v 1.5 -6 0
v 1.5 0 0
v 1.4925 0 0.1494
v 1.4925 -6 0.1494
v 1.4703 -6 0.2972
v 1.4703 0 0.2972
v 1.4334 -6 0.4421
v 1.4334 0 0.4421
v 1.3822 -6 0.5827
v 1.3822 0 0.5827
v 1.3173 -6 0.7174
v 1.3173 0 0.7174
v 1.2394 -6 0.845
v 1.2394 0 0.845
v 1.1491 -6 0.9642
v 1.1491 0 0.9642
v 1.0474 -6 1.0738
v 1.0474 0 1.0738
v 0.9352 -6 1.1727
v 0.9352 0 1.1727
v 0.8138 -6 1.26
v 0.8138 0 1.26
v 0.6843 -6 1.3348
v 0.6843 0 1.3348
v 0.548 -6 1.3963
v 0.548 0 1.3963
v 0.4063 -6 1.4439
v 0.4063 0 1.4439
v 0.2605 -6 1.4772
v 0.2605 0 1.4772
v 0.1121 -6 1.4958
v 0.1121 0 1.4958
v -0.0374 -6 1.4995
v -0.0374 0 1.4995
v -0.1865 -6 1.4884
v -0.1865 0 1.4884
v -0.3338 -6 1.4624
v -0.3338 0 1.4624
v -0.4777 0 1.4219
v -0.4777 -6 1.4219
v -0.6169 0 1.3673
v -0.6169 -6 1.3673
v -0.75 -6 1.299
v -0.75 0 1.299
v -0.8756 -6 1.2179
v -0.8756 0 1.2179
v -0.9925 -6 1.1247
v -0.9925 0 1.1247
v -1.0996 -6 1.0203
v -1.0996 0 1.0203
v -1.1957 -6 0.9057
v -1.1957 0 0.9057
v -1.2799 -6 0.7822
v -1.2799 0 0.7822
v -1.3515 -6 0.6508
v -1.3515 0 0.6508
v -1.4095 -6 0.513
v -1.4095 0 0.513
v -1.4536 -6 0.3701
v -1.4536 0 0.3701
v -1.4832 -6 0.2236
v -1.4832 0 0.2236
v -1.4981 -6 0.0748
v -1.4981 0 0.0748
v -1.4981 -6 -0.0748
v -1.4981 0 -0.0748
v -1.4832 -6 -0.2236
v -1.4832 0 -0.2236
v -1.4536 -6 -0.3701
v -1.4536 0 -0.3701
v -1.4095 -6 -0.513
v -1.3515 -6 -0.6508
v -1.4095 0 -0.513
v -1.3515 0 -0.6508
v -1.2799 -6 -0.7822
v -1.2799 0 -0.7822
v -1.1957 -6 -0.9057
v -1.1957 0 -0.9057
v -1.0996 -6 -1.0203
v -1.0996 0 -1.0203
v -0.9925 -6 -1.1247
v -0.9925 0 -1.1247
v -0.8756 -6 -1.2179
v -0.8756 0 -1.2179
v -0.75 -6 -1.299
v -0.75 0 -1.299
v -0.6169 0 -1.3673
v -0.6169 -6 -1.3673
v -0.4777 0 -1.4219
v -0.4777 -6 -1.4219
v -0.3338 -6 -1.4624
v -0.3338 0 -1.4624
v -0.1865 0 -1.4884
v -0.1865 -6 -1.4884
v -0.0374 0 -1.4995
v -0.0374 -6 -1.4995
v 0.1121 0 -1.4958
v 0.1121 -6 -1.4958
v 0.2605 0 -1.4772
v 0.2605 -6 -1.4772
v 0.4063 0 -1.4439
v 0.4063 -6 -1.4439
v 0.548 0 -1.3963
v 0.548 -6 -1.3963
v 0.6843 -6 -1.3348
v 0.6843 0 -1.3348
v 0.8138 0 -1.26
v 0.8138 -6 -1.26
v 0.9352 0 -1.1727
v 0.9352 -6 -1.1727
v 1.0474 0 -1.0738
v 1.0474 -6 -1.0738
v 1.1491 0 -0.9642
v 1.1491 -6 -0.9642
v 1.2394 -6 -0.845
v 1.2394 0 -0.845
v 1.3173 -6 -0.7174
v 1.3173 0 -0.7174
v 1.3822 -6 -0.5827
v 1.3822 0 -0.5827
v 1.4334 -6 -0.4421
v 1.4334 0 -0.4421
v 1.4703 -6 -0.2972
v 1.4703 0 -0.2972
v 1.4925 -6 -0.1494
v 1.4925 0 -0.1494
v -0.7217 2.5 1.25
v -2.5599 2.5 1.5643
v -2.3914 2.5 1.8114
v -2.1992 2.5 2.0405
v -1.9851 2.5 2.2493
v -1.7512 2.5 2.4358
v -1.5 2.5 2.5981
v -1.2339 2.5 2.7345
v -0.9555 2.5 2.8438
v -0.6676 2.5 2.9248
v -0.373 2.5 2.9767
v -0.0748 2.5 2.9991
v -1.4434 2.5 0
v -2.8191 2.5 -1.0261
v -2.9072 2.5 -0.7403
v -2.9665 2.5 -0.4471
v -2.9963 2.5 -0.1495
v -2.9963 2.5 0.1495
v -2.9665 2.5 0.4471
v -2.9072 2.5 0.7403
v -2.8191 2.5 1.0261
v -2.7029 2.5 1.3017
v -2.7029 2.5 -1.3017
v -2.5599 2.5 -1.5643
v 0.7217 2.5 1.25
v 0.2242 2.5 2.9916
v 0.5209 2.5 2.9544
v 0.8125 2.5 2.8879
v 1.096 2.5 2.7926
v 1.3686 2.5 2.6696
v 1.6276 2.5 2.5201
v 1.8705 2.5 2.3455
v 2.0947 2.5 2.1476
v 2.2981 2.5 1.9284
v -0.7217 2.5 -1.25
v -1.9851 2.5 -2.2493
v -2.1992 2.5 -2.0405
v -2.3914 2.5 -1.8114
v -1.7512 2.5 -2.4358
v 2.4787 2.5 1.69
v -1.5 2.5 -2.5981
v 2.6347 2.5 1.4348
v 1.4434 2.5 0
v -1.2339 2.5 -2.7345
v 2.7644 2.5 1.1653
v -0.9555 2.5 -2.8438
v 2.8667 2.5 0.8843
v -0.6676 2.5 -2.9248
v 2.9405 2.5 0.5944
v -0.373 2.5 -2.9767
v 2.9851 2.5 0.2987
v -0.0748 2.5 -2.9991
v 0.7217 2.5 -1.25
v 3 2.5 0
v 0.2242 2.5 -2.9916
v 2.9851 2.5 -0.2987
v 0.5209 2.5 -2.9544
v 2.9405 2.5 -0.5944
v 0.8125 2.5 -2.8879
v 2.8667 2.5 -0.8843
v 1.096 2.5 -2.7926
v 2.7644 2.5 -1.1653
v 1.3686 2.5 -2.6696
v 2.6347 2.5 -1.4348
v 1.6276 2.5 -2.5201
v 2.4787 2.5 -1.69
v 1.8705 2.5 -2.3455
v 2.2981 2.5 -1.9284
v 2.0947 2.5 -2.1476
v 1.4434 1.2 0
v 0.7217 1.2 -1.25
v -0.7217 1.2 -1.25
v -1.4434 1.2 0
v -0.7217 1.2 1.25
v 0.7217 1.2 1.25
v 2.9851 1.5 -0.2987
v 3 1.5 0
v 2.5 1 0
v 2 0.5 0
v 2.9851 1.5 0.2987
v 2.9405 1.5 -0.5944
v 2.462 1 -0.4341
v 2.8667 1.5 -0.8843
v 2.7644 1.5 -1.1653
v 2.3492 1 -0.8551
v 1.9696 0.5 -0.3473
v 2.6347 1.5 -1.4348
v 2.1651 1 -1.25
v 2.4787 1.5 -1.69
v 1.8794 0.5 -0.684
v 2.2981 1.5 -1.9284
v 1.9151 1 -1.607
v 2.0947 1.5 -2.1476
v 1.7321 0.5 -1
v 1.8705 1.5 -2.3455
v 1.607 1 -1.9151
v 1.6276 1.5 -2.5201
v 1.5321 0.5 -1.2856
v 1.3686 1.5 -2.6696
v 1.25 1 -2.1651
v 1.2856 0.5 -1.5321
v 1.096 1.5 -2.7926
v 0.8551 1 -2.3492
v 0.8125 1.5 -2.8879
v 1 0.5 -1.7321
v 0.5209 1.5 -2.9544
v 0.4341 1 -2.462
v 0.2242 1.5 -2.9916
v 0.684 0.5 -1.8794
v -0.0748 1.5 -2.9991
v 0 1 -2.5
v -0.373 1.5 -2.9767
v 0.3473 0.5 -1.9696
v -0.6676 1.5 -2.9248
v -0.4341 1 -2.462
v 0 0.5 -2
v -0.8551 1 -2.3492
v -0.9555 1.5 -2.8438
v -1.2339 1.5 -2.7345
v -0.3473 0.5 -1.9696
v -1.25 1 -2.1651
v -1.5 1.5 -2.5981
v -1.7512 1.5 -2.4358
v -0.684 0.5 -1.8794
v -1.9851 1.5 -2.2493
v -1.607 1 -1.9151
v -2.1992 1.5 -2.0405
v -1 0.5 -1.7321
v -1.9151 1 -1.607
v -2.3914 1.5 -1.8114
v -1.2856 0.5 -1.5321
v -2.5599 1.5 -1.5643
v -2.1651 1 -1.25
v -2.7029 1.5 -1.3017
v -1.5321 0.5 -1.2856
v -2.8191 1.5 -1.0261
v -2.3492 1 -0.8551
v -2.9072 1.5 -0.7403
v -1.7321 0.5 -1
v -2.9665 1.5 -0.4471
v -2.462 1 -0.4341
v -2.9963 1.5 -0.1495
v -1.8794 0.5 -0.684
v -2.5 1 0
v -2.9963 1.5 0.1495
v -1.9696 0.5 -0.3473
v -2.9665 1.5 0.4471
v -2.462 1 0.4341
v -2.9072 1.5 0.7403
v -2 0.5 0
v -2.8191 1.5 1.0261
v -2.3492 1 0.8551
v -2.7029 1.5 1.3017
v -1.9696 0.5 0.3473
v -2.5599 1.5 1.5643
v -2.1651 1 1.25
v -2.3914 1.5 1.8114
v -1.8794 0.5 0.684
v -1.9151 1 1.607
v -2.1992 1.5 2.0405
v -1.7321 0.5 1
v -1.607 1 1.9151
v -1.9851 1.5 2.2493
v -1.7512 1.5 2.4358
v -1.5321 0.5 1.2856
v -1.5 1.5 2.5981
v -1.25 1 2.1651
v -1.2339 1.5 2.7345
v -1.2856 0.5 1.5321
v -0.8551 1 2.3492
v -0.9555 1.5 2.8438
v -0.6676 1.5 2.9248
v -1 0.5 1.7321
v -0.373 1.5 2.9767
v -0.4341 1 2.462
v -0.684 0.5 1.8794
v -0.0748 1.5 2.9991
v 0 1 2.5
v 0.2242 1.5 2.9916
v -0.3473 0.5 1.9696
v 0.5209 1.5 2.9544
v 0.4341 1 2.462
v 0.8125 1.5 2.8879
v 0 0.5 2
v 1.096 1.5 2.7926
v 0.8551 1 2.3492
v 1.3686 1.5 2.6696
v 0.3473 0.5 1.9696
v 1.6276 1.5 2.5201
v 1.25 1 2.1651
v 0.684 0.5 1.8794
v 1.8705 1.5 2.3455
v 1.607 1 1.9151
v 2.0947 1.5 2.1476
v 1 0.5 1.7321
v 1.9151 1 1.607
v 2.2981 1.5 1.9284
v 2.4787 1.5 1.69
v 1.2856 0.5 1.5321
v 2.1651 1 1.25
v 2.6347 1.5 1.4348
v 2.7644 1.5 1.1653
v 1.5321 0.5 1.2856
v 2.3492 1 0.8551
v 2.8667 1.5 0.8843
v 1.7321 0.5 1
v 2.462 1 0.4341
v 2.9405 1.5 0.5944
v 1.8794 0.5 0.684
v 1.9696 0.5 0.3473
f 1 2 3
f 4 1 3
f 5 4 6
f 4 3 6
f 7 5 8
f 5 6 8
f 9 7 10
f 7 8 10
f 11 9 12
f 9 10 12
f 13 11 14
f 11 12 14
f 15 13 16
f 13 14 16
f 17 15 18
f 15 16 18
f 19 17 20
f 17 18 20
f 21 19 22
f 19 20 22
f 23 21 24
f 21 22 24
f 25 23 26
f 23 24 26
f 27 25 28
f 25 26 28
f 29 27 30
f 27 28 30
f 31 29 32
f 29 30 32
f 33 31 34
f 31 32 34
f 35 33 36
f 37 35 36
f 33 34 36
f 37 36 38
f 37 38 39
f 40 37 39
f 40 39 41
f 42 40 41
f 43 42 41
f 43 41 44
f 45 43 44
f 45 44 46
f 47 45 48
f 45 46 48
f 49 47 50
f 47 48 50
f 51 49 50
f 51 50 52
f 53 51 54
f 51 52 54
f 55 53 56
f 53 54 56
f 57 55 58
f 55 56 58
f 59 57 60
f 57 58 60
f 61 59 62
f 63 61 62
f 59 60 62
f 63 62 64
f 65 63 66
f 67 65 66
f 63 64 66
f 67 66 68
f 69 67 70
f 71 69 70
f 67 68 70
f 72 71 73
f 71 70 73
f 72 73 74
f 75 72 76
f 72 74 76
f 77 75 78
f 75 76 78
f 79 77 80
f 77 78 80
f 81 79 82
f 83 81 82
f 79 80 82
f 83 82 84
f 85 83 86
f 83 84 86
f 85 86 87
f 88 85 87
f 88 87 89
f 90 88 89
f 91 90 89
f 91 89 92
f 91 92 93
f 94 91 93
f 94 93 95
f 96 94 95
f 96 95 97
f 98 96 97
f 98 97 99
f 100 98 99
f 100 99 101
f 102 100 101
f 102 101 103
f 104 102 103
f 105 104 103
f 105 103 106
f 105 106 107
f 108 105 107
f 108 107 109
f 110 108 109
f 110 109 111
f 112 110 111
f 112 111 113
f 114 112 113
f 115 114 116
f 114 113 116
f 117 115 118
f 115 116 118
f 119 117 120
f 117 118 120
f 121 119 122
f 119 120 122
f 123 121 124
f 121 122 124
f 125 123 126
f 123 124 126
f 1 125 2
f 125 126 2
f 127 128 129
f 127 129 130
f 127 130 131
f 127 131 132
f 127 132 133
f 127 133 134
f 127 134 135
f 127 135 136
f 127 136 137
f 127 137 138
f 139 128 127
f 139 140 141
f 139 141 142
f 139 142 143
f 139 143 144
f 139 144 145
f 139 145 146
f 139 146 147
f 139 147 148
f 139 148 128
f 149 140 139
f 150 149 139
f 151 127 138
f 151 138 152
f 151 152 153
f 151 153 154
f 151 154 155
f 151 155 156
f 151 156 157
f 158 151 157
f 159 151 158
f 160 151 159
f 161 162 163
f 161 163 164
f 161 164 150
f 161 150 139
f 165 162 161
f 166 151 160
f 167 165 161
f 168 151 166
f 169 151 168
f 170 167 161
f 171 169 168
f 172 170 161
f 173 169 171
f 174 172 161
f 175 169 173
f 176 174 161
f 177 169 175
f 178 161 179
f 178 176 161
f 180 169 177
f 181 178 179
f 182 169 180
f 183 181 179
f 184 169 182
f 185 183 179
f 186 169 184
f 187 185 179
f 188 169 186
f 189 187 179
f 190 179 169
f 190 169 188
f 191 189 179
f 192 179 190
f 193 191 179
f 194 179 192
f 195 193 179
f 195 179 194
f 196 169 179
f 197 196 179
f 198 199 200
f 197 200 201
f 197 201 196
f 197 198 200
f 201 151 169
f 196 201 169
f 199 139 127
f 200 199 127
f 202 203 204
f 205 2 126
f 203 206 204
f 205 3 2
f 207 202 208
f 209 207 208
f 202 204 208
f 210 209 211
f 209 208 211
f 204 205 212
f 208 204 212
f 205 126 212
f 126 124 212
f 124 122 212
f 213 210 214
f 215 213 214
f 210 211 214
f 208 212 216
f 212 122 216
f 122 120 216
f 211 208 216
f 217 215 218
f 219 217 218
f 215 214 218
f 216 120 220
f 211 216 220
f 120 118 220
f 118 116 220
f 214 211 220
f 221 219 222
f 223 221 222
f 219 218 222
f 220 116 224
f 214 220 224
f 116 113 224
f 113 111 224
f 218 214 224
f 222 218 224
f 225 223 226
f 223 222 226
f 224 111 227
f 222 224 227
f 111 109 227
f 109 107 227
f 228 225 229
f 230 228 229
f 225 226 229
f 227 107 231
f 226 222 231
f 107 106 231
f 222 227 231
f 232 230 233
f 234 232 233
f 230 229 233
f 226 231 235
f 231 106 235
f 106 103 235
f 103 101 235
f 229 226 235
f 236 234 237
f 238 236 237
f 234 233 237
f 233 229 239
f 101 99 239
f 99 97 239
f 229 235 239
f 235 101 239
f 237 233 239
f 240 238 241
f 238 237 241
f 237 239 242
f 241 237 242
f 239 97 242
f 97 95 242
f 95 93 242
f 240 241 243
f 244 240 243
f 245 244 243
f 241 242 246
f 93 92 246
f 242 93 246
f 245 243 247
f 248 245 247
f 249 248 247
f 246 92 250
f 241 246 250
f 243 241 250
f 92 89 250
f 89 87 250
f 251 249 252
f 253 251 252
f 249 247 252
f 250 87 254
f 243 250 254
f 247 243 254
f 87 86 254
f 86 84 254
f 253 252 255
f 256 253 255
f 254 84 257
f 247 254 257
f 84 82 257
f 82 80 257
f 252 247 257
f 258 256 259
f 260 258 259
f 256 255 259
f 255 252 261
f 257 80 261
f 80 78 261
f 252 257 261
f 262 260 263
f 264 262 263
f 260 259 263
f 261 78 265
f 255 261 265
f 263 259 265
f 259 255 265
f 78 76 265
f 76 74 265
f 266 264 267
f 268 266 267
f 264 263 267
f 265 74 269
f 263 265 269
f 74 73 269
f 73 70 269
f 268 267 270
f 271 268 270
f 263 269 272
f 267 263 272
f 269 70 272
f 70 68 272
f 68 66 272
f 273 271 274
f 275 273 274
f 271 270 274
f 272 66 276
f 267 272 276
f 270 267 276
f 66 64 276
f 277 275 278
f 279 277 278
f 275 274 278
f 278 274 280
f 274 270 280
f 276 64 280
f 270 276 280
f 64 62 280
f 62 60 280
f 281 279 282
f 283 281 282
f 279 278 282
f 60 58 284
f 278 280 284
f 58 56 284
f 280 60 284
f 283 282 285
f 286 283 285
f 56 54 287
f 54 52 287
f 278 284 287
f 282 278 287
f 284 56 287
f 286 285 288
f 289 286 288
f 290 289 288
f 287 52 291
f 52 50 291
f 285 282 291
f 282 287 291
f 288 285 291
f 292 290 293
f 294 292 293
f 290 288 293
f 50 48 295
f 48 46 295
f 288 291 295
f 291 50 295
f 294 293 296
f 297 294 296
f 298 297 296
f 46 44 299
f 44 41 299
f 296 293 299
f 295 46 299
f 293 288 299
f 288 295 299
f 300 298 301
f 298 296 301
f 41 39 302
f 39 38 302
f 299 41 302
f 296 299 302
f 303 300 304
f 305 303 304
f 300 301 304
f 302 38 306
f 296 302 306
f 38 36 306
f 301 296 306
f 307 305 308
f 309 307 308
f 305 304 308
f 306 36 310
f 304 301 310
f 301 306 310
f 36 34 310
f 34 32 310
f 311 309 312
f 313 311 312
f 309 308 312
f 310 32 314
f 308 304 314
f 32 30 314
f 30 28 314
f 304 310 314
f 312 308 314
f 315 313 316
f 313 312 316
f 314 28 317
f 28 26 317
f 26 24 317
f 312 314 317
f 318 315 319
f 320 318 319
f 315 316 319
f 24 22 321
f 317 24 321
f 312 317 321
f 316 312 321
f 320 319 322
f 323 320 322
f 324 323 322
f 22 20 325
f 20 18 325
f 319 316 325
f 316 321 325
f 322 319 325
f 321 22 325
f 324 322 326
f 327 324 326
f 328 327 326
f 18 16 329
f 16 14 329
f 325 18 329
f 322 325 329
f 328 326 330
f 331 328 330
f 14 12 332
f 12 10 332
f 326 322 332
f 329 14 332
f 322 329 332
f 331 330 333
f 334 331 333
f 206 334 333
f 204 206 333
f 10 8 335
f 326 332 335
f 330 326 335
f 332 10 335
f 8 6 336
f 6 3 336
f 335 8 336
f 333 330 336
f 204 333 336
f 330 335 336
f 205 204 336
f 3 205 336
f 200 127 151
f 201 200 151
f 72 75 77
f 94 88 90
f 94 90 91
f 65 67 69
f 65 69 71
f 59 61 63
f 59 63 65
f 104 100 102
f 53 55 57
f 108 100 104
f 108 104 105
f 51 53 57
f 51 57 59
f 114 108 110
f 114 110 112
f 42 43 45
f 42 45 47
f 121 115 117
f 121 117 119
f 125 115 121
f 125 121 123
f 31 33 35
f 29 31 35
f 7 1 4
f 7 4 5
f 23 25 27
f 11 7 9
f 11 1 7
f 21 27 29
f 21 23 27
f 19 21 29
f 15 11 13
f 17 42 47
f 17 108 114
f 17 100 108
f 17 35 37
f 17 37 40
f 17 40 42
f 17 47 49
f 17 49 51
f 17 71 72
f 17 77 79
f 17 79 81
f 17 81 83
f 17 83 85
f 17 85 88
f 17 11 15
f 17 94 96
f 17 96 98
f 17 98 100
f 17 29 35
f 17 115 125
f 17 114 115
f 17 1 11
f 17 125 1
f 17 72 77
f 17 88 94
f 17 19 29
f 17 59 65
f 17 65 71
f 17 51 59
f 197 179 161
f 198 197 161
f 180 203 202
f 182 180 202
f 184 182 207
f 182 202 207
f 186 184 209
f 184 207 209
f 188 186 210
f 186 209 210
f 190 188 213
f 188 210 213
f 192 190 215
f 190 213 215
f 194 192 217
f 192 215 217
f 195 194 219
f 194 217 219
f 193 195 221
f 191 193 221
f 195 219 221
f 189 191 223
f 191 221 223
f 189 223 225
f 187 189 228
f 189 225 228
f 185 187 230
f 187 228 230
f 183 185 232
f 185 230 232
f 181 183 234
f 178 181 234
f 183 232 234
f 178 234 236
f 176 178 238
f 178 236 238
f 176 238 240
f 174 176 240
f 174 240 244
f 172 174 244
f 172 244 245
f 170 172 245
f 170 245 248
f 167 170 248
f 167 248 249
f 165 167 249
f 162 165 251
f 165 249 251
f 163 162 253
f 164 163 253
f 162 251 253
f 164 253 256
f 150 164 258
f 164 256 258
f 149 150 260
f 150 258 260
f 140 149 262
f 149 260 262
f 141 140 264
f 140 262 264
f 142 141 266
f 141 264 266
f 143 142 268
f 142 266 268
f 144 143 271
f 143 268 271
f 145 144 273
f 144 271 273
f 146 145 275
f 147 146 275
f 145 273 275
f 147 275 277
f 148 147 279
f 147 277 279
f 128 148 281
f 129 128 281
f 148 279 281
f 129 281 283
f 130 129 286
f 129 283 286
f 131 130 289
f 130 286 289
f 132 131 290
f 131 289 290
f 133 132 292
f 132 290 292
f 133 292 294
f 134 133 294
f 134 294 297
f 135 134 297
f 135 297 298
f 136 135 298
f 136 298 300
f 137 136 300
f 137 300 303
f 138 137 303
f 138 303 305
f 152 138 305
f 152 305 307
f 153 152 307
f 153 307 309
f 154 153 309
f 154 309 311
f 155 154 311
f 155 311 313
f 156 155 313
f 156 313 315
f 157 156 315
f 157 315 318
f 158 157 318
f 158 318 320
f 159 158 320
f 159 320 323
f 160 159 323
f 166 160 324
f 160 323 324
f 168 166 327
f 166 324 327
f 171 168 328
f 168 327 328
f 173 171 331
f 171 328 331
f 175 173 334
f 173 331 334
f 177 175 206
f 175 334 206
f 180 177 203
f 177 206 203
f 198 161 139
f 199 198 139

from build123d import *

# Parameters (mm, degrees)
SKETCH_1_R            = 3
EXTRUDE_251_DEPTH     = 2.5
CHAMFER_1_SIZE        = 1.5
CUT_EXTRUDE_459_DEPTH = 1.3
SKETCH_3_R            = 1.5
EXTRUDE_571_DEPTH     = 6


with BuildPart() as part:
    # 草图1 → Extrude 251 (new body)
    with BuildSketch(Plane(origin=(0, 0, 0), x_dir=(1, 0, 0), z_dir=(0, 1, 0))):
        Circle(SKETCH_1_R)
    extrude(amount=EXTRUDE_251_DEPTH)

    # 倒角1
    chamfer_1_edges = [part.edges().sort_by_distance(p)[0] for p in [
        (-3, 0, 0),
    ]]
    chamfer(chamfer_1_edges, length=CHAMFER_1_SIZE)

    # 草图2 → Cut-Extrude 459 (cut)
    with BuildSketch(Plane(origin=(0, 2.5, 0), x_dir=(1, 0, 0), z_dir=(0, 1, 0))):
        Polygon((1.443375673, 0), (0.721687836, 1.25), (-0.721687836, 1.25), (-1.443375673, 0), (-0.721687836, -1.25), (0.721687836, -1.25), align=None)
    extrude(amount=-CUT_EXTRUDE_459_DEPTH, mode=Mode.SUBTRACT)

    # 草图3 → Extrude 571 (add)
    with BuildSketch(Plane.XZ):
        Circle(SKETCH_3_R)
    extrude(amount=EXTRUDE_571_DEPTH)


solid = part.part
